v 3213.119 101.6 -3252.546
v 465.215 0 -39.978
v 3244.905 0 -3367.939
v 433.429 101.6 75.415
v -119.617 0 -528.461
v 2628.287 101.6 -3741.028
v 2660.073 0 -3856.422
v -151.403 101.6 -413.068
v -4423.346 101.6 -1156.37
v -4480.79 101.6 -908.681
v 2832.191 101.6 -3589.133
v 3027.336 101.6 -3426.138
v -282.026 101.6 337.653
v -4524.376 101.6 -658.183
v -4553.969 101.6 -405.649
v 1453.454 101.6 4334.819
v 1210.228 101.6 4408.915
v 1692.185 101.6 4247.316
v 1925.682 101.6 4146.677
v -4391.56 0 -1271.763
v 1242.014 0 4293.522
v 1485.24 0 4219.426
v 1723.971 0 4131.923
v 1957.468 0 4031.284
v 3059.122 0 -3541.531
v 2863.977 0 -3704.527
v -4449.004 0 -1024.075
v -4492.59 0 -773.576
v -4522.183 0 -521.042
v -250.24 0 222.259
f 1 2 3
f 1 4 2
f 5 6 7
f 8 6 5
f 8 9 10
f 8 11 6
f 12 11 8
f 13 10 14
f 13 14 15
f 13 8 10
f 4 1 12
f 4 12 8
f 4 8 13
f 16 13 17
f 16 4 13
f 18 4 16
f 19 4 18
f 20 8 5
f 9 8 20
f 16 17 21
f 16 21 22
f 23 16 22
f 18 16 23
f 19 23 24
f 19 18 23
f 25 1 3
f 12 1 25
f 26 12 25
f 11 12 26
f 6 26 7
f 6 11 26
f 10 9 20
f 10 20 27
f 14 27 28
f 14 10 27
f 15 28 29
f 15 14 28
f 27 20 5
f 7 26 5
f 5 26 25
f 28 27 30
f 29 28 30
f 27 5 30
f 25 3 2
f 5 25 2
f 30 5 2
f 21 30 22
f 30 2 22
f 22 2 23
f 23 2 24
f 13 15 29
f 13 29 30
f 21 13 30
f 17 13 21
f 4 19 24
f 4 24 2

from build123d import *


with BuildPart() as part:
    # Sweep8: sweep along a curve in space
    with BuildLine() as sweep8_path:
        Line((-4391.560400513, 0, -1271.763047368), (-4423.346397996, 101.6, -1156.369596338))
    # Sketch3 → Sweep8 (sweep)
    with BuildSketch(Plane(origin=(0, 101.6, 0), x_dir=(1, 0, 0), z_dir=(0, 1, 0))):
        with BuildLine():
            Line((-151.40316522, 413.067889773), (-4423.346397996, 1156.369596338))
            ThreePointArc((-4423.346397996, 1156.369596338), (-4504.324931719, 783.735229201), (-4553.968936196, 405.648774386))
            Line((-4553.968936196, 405.648774386), (-282.025703421, -337.652932181))
            Line((-282.025703421, -337.652932181), (1210.227752405, -4408.915148572))
            ThreePointArc((1210.227752405, -4408.915148572), (1573.427847531, -4292.72743237), (1925.682324466, -4146.677173984))
            Line((1925.682324466, -4146.677173984), (433.428868641, -75.414957593))
            Line((433.428868641, -75.414957593), (3213.118645591, 3252.545552233))
            ThreePointArc((3213.118645591, 3252.545552233), (2930.897084189, 3508.992203168), (2628.28661173, 3741.028399598))
            Line((2628.28661173, 3741.028399598), (-151.40316522, 413.067889773))
        make_face()
    sweep(path=sweep8_path.line)


solid = part.part
